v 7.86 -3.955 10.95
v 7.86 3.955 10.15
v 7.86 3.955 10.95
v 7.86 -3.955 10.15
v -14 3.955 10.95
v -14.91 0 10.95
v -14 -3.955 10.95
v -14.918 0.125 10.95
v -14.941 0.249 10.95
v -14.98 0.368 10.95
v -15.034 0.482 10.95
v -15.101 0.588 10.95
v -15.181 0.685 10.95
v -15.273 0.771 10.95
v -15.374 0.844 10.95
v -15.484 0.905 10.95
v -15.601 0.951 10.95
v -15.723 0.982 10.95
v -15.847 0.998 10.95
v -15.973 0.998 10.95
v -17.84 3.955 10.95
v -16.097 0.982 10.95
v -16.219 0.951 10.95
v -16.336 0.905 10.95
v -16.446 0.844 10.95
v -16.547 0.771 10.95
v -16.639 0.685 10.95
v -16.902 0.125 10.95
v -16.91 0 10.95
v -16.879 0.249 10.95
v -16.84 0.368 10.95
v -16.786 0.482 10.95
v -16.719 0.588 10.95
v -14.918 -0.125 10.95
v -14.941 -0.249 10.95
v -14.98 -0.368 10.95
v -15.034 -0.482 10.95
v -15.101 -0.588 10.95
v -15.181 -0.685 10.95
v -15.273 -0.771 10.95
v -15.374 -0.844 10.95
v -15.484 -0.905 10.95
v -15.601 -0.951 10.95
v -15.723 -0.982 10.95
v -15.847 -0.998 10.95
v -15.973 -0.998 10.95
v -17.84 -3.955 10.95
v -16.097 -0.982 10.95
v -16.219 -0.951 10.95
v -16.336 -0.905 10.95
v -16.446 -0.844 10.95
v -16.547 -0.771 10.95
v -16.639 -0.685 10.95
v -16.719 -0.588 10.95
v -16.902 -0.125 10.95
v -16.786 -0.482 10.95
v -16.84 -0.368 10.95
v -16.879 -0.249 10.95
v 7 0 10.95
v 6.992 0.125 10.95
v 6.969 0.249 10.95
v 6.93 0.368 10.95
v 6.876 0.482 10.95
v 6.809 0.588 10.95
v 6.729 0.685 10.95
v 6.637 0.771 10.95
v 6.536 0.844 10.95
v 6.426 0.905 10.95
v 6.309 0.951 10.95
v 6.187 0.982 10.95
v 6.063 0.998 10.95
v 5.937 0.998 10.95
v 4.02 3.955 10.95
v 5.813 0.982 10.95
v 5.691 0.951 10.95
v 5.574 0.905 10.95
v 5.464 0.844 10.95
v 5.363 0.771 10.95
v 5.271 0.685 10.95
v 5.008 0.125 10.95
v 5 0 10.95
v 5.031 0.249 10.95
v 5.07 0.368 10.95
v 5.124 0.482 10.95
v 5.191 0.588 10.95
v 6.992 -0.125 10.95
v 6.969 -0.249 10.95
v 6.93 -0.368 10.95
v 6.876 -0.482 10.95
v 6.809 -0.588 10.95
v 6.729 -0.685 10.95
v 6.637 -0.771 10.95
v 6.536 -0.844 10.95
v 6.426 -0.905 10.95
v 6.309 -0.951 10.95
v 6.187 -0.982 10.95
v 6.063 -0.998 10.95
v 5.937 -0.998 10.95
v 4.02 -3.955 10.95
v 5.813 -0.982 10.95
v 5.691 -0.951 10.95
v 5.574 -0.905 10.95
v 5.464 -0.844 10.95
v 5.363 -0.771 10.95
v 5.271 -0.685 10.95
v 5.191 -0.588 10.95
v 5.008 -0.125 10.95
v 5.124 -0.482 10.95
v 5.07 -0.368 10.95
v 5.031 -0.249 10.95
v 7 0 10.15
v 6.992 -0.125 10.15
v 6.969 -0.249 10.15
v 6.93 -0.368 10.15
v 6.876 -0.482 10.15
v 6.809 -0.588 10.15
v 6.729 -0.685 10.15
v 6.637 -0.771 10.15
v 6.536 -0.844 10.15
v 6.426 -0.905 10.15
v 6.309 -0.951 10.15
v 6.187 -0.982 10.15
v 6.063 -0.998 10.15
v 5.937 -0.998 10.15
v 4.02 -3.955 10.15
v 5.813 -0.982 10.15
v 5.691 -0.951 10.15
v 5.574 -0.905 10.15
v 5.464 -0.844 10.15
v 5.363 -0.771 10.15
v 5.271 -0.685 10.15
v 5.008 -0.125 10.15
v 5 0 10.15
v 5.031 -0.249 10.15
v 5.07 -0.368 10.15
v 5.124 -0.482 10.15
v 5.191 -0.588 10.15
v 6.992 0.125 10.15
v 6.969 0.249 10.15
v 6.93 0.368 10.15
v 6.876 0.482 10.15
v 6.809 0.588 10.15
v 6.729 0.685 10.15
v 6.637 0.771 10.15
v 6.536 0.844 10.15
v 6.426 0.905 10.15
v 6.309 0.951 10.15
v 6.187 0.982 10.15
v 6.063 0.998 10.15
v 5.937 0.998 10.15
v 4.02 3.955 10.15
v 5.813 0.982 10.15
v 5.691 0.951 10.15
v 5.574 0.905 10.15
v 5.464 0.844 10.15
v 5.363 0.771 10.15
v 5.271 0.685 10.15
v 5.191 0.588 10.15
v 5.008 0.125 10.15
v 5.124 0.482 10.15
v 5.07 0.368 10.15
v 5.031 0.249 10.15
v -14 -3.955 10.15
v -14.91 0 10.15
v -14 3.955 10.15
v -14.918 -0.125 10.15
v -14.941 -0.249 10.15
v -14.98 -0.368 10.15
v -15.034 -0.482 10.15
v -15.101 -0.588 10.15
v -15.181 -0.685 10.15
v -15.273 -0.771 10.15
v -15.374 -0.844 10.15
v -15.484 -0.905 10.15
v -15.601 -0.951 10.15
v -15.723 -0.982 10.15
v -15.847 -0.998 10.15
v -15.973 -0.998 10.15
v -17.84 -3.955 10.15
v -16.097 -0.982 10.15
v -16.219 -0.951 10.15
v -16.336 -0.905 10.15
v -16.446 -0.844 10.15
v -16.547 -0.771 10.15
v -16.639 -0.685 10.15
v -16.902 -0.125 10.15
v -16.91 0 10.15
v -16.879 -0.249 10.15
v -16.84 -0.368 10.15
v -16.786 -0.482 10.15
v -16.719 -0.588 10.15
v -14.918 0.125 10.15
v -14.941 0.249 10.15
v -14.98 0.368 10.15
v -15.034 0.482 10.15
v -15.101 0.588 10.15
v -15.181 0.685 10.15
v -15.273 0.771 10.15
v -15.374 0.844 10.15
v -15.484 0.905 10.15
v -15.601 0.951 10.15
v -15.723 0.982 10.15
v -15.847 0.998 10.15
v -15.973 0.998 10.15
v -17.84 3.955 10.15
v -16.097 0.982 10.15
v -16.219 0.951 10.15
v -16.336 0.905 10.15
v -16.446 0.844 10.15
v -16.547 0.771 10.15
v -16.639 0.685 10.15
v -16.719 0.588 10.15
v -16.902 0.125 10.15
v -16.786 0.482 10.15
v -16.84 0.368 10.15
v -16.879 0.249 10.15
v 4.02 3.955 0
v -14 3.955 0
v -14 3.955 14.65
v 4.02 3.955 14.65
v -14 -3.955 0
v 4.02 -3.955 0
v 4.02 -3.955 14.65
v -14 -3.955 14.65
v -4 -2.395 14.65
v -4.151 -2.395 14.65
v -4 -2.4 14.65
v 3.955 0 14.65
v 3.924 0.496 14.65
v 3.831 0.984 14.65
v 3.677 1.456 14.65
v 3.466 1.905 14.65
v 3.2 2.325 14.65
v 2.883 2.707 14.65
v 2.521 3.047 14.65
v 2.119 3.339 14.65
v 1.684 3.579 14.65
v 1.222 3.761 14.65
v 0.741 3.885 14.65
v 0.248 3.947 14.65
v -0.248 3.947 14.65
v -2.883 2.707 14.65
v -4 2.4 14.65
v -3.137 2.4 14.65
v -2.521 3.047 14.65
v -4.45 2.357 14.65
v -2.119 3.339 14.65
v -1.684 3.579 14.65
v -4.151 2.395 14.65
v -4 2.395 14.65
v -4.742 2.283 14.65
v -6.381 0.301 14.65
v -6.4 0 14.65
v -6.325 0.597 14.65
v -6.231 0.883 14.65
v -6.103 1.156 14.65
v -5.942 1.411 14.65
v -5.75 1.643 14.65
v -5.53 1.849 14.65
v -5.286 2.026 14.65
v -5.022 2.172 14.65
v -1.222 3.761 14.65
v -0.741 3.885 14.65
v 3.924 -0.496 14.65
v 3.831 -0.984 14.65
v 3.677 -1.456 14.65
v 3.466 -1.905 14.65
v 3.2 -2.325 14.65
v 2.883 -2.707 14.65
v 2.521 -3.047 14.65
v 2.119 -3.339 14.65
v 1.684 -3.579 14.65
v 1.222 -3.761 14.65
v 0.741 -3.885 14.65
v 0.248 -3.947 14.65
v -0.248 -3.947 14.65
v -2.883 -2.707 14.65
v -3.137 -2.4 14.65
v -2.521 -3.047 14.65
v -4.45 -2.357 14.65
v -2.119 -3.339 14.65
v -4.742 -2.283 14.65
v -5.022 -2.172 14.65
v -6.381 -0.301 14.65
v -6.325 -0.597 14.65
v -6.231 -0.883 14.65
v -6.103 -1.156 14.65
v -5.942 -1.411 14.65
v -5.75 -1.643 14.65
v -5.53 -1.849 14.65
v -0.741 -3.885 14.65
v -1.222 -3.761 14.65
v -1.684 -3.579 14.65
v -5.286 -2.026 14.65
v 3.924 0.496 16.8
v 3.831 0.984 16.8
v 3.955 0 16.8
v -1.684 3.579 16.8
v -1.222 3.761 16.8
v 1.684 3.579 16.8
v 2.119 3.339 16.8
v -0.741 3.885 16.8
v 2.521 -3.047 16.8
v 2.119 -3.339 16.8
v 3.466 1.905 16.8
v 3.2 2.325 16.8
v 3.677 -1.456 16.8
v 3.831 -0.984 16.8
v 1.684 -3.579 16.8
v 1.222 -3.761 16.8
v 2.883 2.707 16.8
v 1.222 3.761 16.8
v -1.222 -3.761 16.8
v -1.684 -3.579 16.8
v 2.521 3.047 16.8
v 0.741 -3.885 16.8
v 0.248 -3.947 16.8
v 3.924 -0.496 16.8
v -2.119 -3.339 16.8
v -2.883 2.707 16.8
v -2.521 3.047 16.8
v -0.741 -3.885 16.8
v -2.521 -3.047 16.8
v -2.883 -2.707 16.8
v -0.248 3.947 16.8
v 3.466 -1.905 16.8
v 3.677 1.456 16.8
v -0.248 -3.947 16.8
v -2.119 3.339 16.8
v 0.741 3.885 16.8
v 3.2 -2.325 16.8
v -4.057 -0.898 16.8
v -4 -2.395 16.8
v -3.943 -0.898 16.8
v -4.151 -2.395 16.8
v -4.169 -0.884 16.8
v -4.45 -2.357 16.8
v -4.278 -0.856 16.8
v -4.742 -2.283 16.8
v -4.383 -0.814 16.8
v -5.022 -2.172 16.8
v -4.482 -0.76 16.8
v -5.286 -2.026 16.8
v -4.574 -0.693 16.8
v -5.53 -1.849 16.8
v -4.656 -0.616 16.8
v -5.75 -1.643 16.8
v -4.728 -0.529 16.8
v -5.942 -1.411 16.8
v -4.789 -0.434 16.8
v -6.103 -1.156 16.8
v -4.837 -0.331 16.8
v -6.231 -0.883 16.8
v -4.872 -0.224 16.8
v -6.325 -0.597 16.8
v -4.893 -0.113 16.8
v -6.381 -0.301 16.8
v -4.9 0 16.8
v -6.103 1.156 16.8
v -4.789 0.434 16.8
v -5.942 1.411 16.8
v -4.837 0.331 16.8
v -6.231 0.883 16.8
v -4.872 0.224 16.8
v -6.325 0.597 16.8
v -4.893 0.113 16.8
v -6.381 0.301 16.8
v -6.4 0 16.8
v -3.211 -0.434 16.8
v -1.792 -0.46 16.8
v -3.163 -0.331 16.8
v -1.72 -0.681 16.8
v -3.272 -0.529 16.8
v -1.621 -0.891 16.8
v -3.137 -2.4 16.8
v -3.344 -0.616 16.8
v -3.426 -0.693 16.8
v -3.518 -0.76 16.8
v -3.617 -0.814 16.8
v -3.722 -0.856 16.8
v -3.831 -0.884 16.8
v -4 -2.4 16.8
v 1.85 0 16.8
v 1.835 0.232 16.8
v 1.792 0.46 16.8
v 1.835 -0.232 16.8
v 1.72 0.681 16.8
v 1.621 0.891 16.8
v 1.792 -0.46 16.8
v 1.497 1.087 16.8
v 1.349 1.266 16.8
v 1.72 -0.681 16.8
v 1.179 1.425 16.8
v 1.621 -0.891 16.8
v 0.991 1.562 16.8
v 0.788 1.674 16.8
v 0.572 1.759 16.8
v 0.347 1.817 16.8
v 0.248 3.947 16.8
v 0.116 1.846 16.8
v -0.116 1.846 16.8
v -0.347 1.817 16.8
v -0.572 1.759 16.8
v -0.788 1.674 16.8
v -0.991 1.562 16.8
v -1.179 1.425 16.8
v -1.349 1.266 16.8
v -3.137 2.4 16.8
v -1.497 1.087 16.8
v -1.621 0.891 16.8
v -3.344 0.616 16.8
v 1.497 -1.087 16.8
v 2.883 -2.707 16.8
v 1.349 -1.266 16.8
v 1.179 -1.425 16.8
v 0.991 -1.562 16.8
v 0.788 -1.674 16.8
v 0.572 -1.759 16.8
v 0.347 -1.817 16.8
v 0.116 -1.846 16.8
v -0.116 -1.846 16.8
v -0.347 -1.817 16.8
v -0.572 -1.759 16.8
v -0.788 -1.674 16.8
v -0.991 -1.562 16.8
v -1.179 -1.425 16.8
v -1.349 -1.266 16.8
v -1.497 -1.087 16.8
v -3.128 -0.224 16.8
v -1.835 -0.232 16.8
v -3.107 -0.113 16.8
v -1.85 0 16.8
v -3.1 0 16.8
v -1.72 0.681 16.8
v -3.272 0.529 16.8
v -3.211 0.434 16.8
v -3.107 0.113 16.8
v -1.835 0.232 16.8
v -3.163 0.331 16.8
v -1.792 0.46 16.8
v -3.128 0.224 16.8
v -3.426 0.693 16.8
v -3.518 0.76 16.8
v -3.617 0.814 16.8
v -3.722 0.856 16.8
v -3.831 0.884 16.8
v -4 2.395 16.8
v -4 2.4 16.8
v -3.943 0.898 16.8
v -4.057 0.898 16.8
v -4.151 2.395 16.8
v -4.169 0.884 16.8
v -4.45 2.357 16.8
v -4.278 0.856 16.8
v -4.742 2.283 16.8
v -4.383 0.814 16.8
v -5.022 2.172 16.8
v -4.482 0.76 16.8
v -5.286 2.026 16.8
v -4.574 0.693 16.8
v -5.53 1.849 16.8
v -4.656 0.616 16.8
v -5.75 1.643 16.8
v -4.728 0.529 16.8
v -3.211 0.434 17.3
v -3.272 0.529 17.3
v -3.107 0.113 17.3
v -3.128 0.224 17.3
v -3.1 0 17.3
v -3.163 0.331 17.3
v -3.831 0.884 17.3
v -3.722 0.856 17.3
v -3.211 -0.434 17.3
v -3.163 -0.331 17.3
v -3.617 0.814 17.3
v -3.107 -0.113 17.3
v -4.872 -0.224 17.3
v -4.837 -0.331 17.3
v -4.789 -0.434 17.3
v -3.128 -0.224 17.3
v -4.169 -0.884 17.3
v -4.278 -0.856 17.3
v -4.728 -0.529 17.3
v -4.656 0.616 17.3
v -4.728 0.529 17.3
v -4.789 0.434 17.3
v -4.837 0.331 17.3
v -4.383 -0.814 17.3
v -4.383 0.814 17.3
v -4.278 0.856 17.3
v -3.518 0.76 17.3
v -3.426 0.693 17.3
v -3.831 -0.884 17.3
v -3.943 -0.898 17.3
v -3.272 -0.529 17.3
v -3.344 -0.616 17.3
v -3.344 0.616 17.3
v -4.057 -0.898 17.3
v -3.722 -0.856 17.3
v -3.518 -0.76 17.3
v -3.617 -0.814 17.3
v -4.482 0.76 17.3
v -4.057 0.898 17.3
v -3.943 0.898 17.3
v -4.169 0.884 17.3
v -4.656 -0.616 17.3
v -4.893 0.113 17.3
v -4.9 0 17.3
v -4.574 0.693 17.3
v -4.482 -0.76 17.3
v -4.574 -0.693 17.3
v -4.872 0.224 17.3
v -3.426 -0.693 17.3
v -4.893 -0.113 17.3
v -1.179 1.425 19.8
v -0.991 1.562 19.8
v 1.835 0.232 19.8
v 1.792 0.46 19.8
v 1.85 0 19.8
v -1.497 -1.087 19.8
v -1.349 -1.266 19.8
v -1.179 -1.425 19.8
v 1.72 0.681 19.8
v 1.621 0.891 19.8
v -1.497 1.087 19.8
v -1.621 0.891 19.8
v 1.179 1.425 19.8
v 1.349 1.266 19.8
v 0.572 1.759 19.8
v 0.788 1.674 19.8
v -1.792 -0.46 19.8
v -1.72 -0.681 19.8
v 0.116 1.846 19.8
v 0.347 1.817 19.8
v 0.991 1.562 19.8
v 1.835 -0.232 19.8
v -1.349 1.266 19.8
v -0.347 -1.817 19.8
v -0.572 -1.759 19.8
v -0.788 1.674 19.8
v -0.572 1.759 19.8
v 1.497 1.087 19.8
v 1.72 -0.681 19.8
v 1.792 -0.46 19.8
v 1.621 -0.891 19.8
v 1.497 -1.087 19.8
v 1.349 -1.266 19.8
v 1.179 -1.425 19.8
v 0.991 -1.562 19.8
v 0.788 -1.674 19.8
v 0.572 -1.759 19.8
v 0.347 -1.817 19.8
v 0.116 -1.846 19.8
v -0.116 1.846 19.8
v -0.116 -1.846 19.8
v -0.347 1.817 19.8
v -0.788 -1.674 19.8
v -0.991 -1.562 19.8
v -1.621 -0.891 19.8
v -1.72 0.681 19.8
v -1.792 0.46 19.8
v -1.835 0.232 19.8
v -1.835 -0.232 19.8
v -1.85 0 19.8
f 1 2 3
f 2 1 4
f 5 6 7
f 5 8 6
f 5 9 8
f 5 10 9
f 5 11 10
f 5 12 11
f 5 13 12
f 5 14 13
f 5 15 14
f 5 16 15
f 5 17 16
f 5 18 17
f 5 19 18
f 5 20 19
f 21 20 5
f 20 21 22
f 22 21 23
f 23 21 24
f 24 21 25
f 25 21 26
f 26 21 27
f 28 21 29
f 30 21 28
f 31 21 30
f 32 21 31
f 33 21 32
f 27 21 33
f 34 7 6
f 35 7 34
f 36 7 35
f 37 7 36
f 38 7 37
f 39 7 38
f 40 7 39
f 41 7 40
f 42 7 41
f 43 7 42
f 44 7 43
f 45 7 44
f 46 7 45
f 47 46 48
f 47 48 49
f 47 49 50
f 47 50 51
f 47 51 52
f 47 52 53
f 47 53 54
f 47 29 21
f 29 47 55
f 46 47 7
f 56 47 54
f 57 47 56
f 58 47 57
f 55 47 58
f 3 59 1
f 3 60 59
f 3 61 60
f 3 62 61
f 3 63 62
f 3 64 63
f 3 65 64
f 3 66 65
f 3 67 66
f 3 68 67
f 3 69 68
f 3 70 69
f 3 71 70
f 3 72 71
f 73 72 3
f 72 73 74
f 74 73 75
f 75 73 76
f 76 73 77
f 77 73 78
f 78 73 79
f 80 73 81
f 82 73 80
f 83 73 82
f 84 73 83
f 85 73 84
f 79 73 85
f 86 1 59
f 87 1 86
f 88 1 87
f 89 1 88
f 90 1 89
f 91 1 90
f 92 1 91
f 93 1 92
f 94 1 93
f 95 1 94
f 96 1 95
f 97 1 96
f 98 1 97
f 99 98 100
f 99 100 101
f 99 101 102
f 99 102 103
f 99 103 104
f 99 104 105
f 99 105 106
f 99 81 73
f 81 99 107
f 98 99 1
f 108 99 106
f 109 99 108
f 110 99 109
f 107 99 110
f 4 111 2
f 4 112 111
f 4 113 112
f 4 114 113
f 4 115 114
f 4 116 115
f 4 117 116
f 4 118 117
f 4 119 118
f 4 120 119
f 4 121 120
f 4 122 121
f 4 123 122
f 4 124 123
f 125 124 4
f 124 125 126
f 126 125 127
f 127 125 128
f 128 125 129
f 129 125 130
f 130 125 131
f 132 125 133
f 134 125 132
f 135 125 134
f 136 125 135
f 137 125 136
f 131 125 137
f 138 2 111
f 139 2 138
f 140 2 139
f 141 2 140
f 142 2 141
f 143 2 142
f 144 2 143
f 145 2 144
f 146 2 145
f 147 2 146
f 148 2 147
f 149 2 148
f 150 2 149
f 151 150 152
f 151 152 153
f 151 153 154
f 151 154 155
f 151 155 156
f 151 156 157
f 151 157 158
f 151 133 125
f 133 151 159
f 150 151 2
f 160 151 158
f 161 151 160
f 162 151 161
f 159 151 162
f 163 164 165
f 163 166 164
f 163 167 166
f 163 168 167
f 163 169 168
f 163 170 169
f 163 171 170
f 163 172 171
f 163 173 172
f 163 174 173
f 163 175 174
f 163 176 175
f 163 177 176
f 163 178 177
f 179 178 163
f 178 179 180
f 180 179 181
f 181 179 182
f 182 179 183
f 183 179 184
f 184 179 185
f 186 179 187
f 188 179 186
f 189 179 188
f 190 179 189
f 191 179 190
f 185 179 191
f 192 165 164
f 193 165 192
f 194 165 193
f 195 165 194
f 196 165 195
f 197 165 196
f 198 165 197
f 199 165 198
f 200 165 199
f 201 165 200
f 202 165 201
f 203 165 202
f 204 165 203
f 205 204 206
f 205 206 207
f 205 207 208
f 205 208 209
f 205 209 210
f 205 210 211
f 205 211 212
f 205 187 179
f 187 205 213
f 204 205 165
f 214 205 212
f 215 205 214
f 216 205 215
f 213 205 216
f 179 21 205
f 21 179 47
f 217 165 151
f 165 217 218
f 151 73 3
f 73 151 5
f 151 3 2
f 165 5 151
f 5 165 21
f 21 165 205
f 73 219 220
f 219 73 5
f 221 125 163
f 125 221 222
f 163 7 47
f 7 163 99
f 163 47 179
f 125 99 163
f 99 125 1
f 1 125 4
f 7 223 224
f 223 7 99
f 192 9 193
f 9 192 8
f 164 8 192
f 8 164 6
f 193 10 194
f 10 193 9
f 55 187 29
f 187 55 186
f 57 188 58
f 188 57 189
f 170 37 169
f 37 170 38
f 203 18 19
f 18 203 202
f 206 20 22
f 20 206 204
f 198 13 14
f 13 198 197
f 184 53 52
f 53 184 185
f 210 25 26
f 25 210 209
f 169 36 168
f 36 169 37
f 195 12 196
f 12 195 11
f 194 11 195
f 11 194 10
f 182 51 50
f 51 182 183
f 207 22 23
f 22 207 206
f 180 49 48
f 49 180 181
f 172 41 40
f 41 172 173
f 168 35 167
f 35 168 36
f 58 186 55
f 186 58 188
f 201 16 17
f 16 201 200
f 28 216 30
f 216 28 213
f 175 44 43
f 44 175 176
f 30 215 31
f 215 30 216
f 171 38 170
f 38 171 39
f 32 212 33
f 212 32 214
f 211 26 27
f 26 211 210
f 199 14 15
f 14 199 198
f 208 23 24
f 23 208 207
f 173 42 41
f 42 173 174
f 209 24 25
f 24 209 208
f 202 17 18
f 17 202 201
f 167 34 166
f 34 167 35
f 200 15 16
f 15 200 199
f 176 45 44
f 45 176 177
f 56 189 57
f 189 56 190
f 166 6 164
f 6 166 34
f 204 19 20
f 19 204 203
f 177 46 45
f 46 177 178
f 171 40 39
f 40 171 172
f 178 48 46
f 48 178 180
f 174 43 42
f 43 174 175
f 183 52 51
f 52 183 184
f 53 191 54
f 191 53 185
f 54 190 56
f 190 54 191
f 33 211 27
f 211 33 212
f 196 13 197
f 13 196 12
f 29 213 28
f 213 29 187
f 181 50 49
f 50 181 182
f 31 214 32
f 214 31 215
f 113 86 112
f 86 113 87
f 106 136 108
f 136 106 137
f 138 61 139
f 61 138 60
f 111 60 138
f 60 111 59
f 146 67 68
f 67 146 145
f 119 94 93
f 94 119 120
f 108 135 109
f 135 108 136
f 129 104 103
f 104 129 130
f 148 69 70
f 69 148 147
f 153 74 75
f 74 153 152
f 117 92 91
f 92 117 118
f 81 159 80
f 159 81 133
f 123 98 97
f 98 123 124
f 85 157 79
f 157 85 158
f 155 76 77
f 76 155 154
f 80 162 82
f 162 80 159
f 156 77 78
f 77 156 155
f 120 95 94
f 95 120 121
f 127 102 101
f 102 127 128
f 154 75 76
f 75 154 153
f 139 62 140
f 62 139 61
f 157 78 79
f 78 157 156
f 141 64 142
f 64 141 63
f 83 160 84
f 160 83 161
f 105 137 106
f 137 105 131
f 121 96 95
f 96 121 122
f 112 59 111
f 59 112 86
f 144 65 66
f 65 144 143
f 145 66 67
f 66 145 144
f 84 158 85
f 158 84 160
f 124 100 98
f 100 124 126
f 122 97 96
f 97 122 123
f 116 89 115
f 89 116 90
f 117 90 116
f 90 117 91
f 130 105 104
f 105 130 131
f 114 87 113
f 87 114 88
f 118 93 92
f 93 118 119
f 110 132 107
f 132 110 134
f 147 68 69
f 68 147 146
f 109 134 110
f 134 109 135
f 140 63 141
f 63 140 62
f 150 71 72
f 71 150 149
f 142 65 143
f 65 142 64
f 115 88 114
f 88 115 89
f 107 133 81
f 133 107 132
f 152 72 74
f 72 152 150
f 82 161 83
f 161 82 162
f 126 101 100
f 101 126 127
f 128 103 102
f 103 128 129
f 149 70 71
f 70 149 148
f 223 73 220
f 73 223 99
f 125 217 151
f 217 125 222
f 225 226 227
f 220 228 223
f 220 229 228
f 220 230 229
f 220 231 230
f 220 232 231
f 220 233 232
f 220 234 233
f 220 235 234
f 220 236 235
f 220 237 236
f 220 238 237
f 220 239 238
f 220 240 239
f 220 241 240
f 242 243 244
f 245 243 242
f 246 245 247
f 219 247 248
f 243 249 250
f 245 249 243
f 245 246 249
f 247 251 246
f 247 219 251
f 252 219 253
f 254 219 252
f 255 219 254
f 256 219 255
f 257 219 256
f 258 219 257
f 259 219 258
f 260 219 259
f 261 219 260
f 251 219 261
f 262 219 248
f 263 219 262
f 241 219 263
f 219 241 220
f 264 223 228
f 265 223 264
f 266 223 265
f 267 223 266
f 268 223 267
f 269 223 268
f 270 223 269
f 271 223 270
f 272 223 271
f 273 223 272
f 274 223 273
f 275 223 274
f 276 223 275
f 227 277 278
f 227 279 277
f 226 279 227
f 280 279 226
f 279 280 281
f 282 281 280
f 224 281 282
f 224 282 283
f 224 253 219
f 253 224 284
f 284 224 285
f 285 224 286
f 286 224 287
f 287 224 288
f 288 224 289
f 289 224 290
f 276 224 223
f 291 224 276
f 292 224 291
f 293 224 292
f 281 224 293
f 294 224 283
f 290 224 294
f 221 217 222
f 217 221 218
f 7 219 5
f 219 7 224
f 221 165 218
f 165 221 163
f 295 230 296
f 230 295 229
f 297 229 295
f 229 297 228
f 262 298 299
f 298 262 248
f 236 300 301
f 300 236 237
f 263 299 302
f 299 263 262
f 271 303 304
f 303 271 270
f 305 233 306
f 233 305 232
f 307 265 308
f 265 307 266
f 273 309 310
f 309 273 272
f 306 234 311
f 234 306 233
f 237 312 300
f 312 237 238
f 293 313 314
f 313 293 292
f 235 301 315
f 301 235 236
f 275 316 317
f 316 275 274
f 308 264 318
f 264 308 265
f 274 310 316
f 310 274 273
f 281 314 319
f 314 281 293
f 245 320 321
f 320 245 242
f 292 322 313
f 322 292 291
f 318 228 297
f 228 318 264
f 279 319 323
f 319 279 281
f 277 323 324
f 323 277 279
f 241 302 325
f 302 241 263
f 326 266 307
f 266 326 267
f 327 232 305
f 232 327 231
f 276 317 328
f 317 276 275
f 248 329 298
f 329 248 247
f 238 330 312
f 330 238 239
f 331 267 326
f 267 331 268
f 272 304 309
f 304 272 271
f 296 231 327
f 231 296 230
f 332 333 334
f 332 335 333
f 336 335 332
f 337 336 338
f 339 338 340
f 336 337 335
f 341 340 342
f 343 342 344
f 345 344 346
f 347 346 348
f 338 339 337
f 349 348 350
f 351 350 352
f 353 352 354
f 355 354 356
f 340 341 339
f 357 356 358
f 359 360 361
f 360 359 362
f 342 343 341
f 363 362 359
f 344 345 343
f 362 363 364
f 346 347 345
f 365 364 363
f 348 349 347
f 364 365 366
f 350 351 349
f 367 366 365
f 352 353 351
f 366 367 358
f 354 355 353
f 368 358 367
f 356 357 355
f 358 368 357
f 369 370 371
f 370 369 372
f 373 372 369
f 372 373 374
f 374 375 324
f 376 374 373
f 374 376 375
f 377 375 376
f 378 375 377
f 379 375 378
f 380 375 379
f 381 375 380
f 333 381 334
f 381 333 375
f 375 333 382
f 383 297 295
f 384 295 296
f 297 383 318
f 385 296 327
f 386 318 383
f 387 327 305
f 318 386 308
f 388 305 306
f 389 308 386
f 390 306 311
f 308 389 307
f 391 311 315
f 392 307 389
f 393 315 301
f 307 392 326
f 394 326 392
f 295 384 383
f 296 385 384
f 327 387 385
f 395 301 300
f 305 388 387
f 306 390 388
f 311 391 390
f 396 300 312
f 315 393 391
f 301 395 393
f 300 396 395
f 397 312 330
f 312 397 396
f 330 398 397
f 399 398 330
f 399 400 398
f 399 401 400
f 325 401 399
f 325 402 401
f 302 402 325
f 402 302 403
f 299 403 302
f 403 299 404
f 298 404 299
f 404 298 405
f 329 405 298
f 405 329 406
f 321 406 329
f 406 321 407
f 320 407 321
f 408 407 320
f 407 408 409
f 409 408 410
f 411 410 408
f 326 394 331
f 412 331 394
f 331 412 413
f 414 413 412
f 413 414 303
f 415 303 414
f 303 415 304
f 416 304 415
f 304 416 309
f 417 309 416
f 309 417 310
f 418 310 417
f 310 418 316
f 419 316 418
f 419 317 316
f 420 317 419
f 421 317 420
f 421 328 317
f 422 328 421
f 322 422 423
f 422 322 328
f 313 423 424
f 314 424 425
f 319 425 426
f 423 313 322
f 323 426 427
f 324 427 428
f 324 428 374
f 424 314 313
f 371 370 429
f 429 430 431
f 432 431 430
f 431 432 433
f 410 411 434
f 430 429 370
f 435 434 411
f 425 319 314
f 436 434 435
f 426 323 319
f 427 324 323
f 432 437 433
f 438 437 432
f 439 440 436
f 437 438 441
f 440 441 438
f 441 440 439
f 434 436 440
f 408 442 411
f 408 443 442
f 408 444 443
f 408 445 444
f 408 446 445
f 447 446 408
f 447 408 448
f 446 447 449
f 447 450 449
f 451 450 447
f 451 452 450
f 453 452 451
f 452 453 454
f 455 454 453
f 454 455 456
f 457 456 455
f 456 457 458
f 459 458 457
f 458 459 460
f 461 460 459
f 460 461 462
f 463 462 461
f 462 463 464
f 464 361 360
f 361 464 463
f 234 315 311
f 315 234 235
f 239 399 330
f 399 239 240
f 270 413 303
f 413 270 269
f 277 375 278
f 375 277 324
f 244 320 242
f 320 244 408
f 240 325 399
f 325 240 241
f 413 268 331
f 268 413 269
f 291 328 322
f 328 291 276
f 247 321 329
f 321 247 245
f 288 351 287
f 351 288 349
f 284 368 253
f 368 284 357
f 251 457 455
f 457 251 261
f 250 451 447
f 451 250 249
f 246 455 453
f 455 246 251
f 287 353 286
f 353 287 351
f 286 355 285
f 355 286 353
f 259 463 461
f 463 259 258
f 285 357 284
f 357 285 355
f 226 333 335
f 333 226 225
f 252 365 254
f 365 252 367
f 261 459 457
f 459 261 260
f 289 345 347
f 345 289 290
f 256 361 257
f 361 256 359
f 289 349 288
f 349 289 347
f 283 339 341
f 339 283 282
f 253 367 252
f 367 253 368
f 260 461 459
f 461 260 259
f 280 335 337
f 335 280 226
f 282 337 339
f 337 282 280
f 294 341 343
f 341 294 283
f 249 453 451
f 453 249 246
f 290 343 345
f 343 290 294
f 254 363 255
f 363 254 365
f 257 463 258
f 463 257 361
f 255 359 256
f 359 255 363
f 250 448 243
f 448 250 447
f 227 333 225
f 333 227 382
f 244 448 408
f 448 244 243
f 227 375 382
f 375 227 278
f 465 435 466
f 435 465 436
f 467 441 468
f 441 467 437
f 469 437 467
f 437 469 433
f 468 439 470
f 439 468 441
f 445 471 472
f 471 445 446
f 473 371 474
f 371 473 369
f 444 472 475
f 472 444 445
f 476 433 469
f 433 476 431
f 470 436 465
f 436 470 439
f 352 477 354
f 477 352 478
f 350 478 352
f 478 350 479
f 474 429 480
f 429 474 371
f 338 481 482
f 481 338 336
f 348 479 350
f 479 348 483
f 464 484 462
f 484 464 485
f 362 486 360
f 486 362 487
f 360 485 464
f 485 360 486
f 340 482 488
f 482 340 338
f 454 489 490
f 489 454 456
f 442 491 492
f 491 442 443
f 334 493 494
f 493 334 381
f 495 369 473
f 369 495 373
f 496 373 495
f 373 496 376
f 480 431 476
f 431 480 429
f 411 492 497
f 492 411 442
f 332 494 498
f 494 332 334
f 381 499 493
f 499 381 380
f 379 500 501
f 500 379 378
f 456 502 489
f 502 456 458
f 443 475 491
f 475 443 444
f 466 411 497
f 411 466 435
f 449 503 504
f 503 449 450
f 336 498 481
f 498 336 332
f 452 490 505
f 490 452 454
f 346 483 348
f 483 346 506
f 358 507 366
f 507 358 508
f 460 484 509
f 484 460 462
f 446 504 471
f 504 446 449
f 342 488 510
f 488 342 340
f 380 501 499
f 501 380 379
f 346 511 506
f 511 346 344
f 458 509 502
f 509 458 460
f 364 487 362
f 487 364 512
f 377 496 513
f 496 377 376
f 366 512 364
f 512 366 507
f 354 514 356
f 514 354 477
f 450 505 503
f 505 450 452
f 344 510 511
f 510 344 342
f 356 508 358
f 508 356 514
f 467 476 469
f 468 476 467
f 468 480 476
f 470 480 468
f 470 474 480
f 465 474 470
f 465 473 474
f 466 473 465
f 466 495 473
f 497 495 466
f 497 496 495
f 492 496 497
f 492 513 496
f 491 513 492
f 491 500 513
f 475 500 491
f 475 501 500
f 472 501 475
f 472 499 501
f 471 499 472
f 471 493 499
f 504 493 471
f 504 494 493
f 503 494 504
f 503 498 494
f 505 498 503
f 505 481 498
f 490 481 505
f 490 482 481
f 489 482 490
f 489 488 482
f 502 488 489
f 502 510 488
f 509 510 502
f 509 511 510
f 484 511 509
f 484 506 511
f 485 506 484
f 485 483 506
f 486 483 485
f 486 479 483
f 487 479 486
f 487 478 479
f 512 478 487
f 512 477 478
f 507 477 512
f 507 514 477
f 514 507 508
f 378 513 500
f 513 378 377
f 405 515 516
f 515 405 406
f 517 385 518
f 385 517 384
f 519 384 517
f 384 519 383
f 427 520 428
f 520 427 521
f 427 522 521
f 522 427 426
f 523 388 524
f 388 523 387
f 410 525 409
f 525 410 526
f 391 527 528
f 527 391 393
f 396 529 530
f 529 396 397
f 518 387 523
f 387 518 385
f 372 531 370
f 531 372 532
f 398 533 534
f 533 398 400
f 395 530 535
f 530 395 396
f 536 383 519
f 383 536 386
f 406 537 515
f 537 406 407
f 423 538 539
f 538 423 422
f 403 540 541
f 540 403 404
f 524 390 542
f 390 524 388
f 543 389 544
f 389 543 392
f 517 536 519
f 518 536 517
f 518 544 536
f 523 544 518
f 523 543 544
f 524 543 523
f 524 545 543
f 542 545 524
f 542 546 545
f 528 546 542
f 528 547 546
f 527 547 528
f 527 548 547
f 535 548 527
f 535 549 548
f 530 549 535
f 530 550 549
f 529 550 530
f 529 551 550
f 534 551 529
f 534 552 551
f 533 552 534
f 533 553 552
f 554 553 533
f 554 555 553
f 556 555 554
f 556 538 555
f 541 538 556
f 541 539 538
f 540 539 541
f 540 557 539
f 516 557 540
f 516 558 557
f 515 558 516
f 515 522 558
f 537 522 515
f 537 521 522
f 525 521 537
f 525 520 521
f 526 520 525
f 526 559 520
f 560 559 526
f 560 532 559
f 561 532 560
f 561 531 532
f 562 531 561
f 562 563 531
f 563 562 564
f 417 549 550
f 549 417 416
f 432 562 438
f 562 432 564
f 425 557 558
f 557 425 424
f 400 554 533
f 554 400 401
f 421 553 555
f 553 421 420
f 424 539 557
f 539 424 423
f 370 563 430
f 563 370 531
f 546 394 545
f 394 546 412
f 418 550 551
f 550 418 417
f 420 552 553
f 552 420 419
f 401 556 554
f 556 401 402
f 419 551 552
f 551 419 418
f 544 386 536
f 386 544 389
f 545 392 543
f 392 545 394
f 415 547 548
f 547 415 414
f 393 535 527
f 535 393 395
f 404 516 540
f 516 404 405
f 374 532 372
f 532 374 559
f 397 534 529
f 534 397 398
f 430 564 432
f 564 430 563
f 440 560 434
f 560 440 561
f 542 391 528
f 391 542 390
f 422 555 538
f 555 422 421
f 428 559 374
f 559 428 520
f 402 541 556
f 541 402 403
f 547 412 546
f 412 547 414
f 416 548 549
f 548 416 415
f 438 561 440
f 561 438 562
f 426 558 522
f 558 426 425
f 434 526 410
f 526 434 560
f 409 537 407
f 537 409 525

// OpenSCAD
$fn=50;
union(){
    translate([-14,-7.91/2,0]) cube([18.02,7.91,14.65]);//body
    difference(){
        translate([-14-(25.7-18.02)/2,-7.91/2,10.15]) cube([25.7,7.91,0.8]); //flaps
        translate([-15.91,0,0]) cylinder(h=15,d=2);
        translate([6,0,0]) cylinder(h=15,d=2);
    }
    
    translate([0,0,14.65]) cylinder(h=16.8-14.65,d=7.91);//gearhead
    translate([-4,0,14.65]) cylinder(h=16.8-14.65,d=4.8);
    translate([-4,-4.8/2,14.65]) cube([5,4.8,16.8-14.65]);
    translate([-4,0,16.8]) cylinder(h=0.5,d=1.8);
    
    translate([0,0,16.8]) cylinder(h=3,d=3.7); //axis
}
